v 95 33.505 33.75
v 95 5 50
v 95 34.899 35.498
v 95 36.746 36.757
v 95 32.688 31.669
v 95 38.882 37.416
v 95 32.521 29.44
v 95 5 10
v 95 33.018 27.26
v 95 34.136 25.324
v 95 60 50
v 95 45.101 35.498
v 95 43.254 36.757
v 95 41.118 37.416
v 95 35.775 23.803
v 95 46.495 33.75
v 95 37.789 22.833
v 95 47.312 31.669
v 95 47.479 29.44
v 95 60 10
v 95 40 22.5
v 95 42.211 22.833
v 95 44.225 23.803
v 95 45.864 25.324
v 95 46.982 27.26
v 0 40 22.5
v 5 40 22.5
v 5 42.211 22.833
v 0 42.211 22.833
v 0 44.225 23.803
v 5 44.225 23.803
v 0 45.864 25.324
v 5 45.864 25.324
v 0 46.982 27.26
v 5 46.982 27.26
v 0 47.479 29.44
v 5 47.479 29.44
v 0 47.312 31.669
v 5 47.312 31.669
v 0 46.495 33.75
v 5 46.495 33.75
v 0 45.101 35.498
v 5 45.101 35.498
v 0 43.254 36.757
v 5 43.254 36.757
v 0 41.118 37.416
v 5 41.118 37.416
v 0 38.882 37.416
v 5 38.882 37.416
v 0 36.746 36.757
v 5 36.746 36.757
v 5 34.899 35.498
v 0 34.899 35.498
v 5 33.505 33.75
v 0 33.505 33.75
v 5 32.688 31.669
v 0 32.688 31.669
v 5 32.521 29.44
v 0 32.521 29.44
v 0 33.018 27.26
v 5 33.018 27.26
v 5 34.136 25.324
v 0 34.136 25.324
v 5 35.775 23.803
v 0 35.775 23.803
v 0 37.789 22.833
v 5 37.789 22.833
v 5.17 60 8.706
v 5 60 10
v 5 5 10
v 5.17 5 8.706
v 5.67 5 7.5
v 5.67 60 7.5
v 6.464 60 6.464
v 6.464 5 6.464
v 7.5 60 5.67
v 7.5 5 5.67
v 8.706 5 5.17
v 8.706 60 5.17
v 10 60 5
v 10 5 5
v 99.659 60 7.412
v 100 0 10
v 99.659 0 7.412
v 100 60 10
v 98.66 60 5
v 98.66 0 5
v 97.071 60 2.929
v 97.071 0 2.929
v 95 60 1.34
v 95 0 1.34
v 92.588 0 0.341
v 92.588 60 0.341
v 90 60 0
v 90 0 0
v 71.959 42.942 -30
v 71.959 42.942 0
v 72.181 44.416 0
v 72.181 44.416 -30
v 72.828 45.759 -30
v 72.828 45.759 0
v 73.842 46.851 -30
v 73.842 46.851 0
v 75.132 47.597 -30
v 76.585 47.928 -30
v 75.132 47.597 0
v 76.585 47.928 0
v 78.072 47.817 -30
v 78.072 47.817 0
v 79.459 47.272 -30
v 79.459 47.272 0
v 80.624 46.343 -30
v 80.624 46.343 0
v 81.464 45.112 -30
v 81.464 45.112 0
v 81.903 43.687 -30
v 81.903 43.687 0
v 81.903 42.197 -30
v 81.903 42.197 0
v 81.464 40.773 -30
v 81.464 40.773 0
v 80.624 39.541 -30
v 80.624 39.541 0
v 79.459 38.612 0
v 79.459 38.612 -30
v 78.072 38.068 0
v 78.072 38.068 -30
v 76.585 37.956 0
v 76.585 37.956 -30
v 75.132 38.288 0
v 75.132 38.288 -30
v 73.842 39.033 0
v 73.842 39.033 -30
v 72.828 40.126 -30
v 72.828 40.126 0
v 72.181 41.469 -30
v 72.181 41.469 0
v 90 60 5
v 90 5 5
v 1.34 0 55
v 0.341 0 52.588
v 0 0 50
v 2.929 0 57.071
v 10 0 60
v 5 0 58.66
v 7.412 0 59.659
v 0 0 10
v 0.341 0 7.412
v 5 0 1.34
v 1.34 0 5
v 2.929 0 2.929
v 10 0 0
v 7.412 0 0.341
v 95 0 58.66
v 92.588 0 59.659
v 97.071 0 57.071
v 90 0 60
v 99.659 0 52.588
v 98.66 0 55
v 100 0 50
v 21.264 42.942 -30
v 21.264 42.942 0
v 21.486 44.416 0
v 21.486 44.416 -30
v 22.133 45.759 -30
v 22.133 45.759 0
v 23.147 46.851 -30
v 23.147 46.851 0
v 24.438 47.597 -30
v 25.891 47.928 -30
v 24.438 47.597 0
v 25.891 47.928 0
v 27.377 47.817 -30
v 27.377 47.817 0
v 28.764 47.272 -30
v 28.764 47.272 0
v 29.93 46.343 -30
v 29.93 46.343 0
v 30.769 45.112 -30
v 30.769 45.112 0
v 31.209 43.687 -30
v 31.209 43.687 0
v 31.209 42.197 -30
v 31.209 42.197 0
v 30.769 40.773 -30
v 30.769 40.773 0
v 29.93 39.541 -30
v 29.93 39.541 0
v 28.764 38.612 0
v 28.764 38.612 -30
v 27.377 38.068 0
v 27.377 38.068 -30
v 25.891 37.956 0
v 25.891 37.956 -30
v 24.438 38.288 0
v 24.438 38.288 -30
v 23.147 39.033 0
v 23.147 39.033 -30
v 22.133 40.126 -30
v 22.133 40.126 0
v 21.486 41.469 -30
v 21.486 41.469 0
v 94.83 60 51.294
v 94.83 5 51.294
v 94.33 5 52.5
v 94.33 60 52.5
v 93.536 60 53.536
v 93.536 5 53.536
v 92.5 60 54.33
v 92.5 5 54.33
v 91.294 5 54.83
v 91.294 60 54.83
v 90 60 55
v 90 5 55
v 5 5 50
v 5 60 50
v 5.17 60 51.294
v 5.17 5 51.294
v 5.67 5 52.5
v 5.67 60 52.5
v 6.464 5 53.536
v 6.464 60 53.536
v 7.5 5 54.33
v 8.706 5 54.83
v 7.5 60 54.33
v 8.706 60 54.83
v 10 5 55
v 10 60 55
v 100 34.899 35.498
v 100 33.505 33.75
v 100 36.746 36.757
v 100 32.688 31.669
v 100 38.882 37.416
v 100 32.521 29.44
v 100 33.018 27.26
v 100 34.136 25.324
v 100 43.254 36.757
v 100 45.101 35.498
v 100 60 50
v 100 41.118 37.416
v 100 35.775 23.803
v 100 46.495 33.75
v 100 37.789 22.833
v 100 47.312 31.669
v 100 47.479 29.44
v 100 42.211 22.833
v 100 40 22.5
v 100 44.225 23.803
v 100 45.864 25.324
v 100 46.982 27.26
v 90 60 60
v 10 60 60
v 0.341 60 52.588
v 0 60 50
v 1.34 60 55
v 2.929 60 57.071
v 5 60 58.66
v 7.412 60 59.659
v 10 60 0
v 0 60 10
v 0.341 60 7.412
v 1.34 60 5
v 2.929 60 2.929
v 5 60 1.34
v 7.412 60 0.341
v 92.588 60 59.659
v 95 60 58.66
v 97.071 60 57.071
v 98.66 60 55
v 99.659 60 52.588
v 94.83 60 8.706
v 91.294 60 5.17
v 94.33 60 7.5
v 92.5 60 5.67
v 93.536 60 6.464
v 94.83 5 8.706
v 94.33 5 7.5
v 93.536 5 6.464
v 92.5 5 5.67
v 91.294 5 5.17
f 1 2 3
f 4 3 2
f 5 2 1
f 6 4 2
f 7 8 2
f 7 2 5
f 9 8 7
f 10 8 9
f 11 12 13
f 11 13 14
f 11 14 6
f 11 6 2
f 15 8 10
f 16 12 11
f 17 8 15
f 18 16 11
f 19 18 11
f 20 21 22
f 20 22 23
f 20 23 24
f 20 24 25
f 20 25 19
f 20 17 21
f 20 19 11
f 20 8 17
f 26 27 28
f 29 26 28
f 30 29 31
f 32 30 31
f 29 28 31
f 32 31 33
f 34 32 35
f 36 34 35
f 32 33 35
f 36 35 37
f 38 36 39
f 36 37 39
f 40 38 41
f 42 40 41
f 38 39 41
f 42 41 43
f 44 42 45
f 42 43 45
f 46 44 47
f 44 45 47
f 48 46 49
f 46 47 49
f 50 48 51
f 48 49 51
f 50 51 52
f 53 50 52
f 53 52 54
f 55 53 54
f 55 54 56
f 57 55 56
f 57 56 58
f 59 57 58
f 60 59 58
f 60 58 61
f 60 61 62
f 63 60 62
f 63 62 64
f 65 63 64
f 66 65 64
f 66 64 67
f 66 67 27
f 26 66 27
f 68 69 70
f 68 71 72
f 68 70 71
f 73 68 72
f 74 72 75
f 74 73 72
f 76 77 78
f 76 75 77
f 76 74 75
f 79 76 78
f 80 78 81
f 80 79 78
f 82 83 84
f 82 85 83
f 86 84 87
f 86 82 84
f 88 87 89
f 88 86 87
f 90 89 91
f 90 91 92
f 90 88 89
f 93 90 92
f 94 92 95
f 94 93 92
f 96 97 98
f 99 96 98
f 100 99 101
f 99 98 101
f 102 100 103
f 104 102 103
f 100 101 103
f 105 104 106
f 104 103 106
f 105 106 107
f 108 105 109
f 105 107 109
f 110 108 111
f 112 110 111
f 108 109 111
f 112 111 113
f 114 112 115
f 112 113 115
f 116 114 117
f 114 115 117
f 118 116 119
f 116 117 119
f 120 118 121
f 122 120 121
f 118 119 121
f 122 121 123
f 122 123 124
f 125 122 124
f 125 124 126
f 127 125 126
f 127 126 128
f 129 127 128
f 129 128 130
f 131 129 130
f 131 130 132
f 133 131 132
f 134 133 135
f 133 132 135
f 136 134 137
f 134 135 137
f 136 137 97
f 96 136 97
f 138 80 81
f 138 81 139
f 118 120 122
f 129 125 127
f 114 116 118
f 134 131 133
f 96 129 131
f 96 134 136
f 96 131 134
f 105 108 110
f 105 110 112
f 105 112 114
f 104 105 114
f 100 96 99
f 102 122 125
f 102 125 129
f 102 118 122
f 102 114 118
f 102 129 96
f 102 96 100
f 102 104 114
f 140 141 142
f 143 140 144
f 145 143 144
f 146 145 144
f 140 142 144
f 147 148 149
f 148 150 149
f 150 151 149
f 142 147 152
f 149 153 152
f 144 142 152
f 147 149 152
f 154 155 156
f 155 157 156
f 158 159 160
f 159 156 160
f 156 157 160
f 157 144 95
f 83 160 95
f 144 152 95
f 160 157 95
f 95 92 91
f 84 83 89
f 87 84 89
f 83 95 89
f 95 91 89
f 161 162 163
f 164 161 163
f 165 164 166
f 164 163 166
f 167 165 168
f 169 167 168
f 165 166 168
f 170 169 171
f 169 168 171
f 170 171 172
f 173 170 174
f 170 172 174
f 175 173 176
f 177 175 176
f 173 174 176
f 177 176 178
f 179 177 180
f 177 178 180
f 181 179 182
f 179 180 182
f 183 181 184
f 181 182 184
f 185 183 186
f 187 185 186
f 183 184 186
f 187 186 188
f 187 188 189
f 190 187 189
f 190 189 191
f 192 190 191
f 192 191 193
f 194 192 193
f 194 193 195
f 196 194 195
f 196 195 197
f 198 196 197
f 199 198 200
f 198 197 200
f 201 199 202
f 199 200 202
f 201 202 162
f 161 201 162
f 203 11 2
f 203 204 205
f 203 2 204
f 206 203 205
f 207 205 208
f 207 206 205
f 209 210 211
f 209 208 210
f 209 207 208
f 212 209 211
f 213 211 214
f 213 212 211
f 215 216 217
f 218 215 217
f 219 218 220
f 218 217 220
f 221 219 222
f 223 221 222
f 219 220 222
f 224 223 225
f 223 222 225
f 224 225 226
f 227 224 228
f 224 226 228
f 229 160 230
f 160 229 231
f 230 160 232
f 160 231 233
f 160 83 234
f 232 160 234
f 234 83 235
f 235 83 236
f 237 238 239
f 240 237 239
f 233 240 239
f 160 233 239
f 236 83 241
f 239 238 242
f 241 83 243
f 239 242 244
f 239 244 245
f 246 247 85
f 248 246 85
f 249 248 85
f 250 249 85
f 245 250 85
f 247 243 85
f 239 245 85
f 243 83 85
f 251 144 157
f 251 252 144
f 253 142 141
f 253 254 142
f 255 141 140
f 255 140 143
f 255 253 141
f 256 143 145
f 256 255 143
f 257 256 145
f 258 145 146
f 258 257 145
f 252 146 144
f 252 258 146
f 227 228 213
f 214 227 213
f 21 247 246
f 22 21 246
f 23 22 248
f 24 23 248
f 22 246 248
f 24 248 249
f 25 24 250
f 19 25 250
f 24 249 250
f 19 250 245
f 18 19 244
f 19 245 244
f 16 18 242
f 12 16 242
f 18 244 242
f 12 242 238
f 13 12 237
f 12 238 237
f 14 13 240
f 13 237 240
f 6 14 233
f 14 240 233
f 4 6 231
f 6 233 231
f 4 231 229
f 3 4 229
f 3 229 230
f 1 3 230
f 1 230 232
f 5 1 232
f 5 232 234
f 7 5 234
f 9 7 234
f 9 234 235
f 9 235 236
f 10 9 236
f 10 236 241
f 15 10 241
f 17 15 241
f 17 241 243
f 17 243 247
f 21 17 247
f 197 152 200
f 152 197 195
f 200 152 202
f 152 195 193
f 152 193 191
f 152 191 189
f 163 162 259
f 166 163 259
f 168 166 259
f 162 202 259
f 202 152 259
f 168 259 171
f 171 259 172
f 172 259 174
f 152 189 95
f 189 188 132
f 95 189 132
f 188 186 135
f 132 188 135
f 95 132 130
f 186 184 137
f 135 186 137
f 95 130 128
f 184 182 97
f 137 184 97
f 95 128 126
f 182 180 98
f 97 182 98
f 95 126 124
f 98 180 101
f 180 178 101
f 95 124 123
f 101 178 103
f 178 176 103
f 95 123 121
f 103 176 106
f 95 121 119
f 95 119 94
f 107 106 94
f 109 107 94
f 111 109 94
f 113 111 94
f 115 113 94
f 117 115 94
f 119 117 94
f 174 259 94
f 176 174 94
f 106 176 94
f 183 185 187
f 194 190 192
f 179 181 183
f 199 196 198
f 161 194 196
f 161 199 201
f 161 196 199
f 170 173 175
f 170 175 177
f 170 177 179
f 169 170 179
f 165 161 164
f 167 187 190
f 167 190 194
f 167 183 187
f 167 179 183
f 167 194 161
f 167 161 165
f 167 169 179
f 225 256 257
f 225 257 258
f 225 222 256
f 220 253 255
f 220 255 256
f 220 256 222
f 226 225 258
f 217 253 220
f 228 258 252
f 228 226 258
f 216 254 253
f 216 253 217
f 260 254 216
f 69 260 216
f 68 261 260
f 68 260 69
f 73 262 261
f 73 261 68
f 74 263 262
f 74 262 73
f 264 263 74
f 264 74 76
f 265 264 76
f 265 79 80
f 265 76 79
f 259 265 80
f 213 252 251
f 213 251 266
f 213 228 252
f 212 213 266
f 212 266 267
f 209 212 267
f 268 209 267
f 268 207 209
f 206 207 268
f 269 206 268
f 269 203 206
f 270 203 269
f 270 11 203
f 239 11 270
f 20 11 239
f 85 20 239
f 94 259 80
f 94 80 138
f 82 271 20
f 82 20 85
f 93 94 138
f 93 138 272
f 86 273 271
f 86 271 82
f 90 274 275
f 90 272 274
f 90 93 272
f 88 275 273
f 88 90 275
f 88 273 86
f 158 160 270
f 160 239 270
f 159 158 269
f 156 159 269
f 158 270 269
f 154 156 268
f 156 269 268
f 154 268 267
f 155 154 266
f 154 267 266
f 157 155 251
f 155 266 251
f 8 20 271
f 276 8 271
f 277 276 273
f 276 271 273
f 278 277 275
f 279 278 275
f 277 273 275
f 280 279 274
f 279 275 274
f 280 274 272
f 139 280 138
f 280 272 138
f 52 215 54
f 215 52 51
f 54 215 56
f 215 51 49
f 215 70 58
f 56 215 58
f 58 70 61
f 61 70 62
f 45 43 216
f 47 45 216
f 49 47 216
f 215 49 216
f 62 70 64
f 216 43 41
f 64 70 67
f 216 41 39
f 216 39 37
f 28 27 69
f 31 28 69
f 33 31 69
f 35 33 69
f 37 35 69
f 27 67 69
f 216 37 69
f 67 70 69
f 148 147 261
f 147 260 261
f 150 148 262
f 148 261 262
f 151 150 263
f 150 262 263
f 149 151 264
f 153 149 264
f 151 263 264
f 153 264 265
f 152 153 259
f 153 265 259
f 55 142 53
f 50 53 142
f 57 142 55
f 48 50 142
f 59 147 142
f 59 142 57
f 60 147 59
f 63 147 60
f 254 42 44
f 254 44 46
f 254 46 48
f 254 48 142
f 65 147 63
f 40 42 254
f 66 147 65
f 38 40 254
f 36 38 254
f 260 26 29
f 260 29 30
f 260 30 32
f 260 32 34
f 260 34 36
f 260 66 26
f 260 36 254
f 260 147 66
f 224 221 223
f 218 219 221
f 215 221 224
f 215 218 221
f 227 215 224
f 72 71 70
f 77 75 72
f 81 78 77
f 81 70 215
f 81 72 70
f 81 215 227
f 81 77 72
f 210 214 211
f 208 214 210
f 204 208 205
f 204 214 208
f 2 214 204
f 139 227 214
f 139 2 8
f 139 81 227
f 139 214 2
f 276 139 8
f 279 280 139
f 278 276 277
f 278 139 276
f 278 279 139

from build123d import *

# Parameters (mm, degrees)
SKICA1_W                 = 100
SKICA1_H                 = 60
VYSUNOUT1_DEPTH          = 60
ZAOBLIT1_R               = 10
SKO_EPINA1_T             = -5
SKICA2_R                 = 7.5
ODEBRAT_VYSUNUT_M2_DEPTH = 101
SKICA3_R                 = 5
VYSUNOUT2_DEPTH          = 30


with BuildPart() as part:
    # Skica1 → Vysunout1 (new body)
    with BuildSketch(Plane.XY):
        with Locations((50, 30)):
            Rectangle(SKICA1_W, SKICA1_H)
    extrude(amount=VYSUNOUT1_DEPTH)

    # Zaoblit1
    zaoblit1_edges = [part.edges().sort_by_distance(p)[0] for p in [
        (100, 30, 60),
        (0, 30, 60),
        (100, 30, 0),
        (0, 30, 0),
    ]]
    fillet(zaoblit1_edges, radius=ZAOBLIT1_R)

    # Skořepina1
    sko_epina1_openings = [part.faces().sort_by_distance(p)[0] for p in [
        (50, 60, 30),
    ]]
    offset(amount=SKO_EPINA1_T, openings=sko_epina1_openings, kind=Kind.INTERSECTION)

    # Skica2 → Odebrat vysunutím2 (cut, through all)
    with BuildSketch(Plane(origin=(100, 0, 0), x_dir=(0, 0, -1), z_dir=(1, 0, 0))):
        with Locations((-30, 40)):
            Circle(SKICA2_R)
    extrude(amount=-ODEBRAT_VYSUNUT_M2_DEPTH, mode=Mode.SUBTRACT)

    # Skica3 → Vysunout2 (add)
    with BuildSketch(Plane(origin=(0, 0, 0), x_dir=(-1, 0, 0), z_dir=(0, 0, -1))):
        with Locations((-76.959009894, 42.942278301)):
            Circle(SKICA3_R)
        with Locations((-26.264349984, 42.942278301)):
            Circle(SKICA3_R)
    extrude(amount=VYSUNOUT2_DEPTH)


solid = part.part
